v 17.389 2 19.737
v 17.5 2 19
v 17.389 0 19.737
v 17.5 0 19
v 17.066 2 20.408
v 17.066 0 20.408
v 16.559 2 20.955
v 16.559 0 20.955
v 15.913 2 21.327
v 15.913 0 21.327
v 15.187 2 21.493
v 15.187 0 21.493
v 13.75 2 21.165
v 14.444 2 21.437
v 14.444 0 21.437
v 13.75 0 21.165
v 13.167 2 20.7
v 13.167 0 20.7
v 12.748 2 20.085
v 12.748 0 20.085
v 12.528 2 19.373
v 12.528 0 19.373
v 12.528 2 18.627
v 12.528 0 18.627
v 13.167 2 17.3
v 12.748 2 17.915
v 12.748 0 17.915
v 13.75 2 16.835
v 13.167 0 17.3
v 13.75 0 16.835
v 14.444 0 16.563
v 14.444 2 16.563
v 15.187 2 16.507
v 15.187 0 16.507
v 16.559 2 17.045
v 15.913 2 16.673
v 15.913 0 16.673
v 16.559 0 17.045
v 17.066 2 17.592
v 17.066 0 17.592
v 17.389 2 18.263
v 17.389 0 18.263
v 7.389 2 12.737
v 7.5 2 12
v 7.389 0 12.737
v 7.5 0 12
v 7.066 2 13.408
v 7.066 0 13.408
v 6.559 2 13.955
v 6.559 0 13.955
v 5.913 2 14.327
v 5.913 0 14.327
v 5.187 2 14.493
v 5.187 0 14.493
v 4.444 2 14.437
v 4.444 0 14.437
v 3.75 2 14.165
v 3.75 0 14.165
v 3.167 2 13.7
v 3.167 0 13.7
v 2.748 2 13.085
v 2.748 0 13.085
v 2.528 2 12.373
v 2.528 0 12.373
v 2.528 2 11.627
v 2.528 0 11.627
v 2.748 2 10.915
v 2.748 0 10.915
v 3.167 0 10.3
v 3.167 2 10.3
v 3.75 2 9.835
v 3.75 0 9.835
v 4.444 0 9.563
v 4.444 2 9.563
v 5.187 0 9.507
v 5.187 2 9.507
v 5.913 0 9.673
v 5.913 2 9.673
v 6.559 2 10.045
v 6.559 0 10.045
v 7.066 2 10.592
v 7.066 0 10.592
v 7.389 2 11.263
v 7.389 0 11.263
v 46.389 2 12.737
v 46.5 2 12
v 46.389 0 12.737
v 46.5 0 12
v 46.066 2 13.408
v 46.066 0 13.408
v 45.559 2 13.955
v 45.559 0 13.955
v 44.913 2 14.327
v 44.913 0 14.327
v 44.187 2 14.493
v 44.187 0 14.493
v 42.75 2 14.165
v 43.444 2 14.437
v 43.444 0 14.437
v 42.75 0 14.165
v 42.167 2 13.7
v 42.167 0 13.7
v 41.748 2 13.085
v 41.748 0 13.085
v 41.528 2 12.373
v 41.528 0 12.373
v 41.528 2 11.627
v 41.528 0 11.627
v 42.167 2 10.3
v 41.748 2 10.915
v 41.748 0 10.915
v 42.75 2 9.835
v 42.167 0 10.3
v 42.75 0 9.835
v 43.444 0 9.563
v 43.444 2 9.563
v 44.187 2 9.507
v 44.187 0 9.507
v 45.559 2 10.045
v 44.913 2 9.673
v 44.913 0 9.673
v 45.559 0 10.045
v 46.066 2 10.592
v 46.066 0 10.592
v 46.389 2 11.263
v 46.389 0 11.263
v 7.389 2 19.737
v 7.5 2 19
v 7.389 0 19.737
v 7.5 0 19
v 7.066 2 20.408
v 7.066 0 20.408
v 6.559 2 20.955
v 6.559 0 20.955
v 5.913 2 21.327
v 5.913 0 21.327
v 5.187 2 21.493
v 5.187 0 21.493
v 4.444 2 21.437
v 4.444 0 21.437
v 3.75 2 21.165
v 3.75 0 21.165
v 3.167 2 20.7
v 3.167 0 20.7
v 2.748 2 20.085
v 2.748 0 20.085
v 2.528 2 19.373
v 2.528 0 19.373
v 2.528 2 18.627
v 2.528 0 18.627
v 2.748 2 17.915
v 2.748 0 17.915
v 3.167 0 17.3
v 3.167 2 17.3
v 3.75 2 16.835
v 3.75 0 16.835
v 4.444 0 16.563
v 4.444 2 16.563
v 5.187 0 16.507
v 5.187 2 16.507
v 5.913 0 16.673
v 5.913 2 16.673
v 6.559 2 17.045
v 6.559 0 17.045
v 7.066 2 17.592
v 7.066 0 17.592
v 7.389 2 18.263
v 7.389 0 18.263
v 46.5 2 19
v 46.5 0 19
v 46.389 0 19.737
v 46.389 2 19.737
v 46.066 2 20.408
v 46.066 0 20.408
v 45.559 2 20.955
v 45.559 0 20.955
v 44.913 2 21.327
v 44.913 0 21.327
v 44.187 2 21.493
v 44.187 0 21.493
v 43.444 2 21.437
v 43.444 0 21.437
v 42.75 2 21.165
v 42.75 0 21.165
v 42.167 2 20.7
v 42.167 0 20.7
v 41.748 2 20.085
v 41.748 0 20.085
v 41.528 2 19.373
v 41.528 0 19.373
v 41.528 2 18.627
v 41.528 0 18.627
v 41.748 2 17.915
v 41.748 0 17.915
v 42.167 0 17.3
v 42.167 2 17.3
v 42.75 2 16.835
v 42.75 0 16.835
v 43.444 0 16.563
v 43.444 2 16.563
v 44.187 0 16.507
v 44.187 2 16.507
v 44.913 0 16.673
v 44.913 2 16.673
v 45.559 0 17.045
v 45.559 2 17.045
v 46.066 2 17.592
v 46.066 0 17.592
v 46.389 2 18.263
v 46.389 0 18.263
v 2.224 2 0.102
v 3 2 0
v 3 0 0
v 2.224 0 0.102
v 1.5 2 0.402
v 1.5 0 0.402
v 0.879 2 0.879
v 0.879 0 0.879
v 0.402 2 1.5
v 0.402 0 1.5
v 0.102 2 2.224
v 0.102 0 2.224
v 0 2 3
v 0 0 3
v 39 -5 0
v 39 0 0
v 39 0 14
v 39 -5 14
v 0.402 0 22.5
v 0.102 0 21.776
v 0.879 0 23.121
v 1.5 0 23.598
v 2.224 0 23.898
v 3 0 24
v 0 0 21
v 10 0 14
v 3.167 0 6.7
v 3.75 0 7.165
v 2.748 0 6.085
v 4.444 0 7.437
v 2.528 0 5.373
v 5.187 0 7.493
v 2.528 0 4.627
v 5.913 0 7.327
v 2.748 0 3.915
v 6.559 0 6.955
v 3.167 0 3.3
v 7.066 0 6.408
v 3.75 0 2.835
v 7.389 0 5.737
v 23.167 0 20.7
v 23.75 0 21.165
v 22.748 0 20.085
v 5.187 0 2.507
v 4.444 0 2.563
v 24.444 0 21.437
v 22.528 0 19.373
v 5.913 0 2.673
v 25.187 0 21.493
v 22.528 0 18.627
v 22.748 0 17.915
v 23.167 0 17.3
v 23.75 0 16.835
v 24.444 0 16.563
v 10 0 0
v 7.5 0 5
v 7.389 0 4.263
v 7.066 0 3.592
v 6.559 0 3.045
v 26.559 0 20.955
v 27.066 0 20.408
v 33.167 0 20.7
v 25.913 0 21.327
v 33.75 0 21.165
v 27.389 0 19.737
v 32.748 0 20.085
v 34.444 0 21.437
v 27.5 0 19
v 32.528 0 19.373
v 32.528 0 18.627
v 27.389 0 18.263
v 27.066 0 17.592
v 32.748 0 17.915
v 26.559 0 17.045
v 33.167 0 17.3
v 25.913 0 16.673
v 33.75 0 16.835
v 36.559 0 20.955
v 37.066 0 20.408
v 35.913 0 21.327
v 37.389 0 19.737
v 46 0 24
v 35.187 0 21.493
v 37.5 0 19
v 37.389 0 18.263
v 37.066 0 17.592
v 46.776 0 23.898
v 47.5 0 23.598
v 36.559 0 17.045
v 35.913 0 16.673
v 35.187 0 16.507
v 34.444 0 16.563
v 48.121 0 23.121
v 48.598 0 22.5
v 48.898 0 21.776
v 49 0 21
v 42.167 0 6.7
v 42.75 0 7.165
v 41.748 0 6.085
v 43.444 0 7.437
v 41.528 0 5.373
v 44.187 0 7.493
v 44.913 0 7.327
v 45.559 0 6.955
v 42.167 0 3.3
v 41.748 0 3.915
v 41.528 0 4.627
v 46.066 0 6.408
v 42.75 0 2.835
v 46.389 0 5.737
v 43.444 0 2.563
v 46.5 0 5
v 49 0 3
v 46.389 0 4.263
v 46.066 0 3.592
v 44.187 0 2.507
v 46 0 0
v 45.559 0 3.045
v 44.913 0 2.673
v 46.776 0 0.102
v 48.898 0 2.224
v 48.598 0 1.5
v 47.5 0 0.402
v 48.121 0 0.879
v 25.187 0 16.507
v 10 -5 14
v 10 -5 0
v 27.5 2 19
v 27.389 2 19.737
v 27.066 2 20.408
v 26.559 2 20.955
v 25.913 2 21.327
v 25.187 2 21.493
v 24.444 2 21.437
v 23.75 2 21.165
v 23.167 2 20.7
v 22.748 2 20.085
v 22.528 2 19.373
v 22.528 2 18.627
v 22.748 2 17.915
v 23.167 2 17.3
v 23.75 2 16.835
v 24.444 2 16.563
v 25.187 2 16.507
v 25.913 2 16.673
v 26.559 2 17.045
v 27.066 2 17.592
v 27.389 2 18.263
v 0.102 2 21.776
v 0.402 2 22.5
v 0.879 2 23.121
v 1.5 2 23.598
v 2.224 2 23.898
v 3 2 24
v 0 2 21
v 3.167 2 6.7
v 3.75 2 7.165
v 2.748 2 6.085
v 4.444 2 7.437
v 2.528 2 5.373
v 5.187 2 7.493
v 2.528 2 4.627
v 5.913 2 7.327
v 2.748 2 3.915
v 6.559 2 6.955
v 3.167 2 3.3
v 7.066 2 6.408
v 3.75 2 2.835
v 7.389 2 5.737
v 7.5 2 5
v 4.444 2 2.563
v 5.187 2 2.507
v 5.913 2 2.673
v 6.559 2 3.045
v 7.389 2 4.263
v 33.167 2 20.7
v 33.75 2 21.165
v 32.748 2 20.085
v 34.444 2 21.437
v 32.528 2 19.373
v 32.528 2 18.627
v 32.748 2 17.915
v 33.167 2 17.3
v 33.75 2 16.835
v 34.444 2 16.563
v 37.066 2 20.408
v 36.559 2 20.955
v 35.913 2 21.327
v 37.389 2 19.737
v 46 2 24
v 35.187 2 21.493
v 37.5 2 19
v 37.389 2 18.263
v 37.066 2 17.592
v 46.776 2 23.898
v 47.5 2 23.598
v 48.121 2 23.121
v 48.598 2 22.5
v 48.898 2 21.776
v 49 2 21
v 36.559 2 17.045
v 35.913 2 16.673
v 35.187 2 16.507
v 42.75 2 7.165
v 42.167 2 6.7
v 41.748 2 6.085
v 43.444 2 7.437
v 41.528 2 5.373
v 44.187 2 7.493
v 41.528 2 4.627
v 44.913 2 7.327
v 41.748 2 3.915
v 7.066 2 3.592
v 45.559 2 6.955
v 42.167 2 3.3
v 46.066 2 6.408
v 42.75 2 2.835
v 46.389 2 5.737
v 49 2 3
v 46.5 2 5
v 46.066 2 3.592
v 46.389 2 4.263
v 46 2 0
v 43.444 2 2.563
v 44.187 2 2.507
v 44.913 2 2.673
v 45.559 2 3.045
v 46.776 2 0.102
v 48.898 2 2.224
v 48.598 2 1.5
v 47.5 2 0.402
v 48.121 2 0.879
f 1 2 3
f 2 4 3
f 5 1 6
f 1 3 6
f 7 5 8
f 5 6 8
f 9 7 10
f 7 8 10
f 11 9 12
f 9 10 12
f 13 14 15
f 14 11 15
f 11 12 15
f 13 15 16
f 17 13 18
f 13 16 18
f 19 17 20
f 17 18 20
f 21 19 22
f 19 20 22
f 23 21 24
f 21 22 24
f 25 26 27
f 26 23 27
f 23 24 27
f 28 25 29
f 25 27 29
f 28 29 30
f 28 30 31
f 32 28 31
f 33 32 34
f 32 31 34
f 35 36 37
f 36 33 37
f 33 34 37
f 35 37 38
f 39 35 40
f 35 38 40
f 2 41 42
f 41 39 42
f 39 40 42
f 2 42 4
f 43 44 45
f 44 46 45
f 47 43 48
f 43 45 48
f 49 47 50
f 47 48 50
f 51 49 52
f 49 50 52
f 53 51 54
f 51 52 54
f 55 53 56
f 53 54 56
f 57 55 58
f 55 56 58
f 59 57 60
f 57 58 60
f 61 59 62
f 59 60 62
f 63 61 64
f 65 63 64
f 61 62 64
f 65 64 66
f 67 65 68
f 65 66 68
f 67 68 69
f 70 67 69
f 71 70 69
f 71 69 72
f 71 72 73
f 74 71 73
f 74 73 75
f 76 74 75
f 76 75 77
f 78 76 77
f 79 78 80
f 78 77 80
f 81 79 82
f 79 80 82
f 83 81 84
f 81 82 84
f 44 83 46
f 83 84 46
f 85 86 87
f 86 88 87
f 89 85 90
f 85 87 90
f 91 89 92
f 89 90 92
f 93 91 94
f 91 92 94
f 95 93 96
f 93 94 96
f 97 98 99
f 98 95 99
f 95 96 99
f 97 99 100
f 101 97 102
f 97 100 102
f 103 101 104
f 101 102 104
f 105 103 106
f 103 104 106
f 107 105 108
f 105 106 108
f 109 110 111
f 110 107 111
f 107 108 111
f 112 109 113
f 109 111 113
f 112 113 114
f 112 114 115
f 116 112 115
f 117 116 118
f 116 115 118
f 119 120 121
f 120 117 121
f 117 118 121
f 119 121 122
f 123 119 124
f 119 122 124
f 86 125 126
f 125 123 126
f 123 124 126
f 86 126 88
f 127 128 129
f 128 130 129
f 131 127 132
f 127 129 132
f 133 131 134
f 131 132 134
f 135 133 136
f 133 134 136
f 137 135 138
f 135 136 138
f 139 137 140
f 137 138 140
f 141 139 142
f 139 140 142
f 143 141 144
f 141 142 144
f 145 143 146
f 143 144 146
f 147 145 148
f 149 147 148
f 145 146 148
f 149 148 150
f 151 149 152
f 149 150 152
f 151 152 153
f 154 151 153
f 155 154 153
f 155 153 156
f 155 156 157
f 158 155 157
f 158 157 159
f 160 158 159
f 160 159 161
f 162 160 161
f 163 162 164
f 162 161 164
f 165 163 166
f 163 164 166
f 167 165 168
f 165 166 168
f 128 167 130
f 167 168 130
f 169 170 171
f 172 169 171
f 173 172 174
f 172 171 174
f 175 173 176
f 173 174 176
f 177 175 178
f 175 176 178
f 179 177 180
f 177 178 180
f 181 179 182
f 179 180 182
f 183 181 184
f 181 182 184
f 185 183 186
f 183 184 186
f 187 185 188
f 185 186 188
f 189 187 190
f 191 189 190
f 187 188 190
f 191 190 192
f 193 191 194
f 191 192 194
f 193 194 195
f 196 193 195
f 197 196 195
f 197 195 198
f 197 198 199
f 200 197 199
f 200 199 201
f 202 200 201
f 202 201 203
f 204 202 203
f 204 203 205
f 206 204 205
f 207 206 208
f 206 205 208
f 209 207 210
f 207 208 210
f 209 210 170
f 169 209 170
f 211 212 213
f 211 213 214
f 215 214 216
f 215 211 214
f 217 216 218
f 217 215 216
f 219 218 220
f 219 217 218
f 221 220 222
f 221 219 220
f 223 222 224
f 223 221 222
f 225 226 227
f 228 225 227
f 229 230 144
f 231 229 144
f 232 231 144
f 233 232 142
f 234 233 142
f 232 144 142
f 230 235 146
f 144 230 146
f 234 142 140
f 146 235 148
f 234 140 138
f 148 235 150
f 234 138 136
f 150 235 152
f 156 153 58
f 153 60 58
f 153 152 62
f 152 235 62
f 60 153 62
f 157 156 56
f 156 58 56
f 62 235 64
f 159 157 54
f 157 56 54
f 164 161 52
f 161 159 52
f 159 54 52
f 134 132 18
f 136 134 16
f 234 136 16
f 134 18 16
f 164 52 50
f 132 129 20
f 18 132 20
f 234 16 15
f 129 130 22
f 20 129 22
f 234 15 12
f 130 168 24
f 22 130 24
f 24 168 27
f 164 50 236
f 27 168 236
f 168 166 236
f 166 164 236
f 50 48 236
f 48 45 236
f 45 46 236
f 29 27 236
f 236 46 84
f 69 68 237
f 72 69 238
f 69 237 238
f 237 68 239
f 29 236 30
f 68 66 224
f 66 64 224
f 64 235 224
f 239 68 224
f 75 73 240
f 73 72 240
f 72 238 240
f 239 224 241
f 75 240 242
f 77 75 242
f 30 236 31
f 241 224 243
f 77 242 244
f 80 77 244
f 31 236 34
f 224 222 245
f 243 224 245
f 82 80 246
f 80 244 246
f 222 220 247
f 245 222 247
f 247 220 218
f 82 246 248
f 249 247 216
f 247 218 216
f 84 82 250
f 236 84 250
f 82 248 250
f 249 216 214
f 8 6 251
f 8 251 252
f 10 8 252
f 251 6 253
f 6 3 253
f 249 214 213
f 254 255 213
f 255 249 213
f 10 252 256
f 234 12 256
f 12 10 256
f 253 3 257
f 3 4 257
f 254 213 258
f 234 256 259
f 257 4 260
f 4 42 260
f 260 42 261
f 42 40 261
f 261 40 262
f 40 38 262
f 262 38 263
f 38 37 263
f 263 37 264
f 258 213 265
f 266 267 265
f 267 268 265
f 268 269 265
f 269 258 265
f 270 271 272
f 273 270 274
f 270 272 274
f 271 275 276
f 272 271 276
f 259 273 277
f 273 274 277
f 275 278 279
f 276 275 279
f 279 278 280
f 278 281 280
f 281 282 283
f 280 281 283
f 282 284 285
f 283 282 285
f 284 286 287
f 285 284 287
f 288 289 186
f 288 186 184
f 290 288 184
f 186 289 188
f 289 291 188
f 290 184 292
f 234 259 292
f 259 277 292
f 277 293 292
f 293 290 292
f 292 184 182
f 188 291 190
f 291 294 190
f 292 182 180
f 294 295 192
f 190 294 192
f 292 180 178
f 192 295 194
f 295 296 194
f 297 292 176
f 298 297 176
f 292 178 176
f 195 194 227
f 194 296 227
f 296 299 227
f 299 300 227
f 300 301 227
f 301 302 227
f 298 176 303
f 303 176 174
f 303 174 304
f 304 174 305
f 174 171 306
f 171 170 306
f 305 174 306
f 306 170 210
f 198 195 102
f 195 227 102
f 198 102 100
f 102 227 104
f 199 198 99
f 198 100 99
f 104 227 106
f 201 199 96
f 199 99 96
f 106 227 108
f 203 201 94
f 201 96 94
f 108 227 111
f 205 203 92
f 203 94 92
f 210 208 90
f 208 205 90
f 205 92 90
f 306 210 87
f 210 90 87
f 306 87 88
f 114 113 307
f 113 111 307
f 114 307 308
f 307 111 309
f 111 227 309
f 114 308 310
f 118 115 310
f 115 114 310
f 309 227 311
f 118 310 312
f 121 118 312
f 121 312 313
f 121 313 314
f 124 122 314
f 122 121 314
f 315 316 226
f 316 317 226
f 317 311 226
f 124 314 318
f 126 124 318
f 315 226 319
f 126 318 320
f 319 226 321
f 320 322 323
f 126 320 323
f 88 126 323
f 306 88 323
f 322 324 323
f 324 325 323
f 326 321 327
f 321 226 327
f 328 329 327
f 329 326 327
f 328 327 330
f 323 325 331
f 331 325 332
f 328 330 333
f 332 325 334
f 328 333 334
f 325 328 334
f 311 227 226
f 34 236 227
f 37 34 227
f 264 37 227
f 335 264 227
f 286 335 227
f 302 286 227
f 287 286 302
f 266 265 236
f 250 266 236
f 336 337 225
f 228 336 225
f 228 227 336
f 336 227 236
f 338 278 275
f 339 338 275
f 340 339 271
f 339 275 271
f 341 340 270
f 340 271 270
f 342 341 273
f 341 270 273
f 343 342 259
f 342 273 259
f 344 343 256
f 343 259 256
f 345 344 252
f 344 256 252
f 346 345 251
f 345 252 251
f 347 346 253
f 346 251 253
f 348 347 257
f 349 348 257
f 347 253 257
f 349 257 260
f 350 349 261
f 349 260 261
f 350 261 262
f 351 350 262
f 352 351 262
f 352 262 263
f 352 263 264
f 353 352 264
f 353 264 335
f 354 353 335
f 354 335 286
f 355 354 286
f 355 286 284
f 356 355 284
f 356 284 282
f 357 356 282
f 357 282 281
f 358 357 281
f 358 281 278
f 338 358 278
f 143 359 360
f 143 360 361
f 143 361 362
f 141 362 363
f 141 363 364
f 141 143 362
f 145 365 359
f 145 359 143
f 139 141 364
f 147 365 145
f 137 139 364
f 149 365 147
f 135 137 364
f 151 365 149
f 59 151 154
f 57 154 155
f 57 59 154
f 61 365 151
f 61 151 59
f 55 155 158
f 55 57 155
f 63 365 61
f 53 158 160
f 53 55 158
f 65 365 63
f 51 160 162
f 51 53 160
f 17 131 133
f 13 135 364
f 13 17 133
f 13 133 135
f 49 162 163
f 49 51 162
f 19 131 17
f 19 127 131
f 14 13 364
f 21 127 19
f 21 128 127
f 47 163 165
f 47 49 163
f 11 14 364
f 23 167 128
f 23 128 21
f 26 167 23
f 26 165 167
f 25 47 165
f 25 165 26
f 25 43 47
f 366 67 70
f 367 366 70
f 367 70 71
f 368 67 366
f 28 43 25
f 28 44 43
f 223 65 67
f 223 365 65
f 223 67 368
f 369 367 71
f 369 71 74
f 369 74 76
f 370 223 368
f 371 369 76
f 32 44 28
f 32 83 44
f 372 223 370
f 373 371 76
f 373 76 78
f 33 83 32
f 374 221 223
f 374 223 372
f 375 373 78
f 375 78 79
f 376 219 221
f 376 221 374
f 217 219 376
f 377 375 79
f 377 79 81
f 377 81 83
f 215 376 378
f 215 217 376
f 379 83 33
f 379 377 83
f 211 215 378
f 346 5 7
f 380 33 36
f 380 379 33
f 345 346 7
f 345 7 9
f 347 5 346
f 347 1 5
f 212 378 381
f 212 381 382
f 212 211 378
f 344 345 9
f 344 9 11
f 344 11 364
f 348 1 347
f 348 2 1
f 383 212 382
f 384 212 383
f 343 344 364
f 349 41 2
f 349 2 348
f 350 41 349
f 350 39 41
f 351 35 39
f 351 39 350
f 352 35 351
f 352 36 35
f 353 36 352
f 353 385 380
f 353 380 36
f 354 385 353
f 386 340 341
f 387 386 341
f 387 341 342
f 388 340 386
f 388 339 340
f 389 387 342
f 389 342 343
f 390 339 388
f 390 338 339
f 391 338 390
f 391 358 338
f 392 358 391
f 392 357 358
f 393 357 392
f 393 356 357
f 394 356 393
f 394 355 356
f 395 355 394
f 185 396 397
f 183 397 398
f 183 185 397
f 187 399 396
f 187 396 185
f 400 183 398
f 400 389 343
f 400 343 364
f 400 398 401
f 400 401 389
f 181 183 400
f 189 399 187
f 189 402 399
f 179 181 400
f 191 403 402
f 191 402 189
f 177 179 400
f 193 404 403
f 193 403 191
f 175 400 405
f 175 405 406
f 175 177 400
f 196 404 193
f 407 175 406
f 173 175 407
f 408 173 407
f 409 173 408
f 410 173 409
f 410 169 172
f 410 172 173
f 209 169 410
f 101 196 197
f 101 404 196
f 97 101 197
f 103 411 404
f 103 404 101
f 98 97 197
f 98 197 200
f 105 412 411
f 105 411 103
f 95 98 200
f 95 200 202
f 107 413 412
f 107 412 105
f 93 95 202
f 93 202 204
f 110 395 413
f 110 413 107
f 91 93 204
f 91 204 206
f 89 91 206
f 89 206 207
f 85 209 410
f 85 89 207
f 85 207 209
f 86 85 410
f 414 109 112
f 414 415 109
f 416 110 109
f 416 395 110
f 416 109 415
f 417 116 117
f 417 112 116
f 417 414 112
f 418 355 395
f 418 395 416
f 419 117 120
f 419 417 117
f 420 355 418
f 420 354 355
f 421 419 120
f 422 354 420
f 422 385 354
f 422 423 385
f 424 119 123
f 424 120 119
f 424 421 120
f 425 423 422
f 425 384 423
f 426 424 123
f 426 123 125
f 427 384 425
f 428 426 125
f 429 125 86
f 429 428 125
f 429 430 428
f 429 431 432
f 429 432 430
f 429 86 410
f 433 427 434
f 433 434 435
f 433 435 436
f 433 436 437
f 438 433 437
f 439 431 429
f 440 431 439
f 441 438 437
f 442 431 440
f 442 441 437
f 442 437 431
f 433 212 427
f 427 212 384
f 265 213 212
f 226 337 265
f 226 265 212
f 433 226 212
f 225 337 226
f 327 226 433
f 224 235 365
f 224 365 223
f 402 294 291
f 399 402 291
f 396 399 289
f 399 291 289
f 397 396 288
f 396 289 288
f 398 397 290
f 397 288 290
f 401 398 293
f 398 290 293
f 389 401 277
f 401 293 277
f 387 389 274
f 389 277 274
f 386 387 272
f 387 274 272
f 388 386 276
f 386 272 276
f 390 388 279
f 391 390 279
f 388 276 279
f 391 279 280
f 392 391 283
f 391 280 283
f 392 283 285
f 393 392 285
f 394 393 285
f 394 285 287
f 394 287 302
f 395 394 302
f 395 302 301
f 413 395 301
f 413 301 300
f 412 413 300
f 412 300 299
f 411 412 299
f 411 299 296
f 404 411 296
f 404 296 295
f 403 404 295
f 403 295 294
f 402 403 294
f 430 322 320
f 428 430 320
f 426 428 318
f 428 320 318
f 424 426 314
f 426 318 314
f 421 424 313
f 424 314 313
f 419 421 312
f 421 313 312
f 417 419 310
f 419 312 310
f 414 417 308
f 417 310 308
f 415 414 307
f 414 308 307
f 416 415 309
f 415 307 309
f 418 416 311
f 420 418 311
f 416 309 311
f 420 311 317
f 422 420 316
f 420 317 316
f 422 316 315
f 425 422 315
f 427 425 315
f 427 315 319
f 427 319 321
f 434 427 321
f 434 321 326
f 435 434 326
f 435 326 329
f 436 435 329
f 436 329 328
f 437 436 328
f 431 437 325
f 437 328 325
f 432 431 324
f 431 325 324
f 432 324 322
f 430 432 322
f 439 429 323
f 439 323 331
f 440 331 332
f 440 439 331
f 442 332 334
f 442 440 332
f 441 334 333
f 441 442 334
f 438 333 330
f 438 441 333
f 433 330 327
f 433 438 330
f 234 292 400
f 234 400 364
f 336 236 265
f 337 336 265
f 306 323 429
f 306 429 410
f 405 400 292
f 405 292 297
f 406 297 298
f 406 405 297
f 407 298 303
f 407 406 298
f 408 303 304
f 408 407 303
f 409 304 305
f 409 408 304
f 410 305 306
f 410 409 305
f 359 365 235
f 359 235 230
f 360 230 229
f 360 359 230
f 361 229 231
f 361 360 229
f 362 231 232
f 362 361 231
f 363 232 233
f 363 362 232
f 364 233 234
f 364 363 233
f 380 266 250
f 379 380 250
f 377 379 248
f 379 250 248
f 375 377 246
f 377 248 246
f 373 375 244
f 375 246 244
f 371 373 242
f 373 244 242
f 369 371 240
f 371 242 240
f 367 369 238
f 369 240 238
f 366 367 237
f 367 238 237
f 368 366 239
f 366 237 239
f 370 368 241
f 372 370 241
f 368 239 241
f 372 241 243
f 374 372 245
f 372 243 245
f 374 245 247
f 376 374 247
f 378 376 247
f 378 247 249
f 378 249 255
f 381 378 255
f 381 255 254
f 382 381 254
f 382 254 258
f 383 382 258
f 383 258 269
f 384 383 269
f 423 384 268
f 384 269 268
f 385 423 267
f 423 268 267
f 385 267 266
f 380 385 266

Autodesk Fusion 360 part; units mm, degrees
sketch "Sketch1" plane through (0, 0, 0) normal (0, 1, 0) x (1, 0, 0)
  line L0 (0, 0) -> (49, 0)
  line L1 (49, 0) -> (49, -24)
  line L2 (49, -24) -> (0, -24)
  line L3 (0, -24) -> (0, 0)
extrude "Extrude1" add sketch "Sketch1" along normal blind 2
sketch "Sketch2" plane through (0, 0, 0) normal (0, 1, 0) x (1, 0, 0)
  line L0 (10, 0) -> (39, 0)
  line L1 (39, 0) -> (39, -14)
  line L2 (39, -14) -> (10, -14)
  line L3 (10, -14) -> (10, 0)
extrude "Extrude2" add sketch "Sketch2" against normal blind 5
fillet "Fillet1" radius 3 1 edges at (0, 1, 24)
fillet "Fillet2" radius 3 1 edges at (49, 1, 24)
fillet "Fillet3" radius 3 1 edges at (49, 1, 0)
fillet "Fillet4" radius 3 1 edges at (0, 1, 0)
sketch "Sketch3" plane through (0, 0, 0) normal (0, 1, 0) x (1, 0, 0)
  circle A0 centre (5, -5) radius 2.5
  dimension "d13" = 5
extrude "Extrude3" cut sketch "Sketch3" along normal blind 3
sketch "Sketch4" plane through (0, 0, 0) normal (0, 1, 0) x (1, 0, 0)
  circle A0 centre (44, -5) radius 2.5
  dimension "d16" = 5
extrude "Extrude4" cut sketch "Sketch4" along normal blind 3
sketch "Sketch5" plane through (0, 0, 0) normal (0, 1, 0) x (1, 0, 0)
  circle A0 centre (5, -19) radius 2.5
  dimension "d19" = 5
extrude "Extrude5" cut sketch "Sketch5" along normal blind 3
sketch "Sketch6" plane through (0, 0, 0) normal (0, 1, 0) x (1, 0, 0)
  circle A0 centre (44, -19) radius 2.5
  dimension "d22" = 5
extrude "Extrude6" cut sketch "Sketch6" along normal blind 3
sketch "Sketch7" plane through (0, 0, 0) normal (0, 1, 0) x (1, 0, 0)
  circle A0 centre (44, -12) radius 2.5
  dimension "d25" = 5
extrude "Extrude7" cut sketch "Sketch7" along normal blind 2
sketch "Sketch8" plane through (0, 0, 0) normal (0, 1, 0) x (1, 0, 0)
  circle A0 centre (5, -12) radius 2.5
  dimension "d28" = 5
extrude "Extrude8" cut sketch "Sketch8" along normal blind 3
sketch "Sketch9" plane through (0, 0, 0) normal (0, 1, 0) x (1, 0, 0)
  circle A0 centre (25, -19) radius 2.5
  dimension "d31" = 5
extrude "Extrude9" cut sketch "Sketch9" along normal blind 3
sketch "Sketch10" plane through (0, 0, 0) normal (0, 1, 0) x (1, 0, 0)
  circle A0 centre (15, -19) radius 2.5
  dimension "d34" = 5
extrude "Extrude10" cut sketch "Sketch10" along normal blind 2
sketch "Sketch11" plane through (0, 0, 0) normal (0, 1, 0) x (1, 0, 0)
  circle A0 centre (35, -19) radius 2.5
  dimension "d37" = 5
extrude "Extrude11" cut sketch "Sketch11" along normal blind 5
